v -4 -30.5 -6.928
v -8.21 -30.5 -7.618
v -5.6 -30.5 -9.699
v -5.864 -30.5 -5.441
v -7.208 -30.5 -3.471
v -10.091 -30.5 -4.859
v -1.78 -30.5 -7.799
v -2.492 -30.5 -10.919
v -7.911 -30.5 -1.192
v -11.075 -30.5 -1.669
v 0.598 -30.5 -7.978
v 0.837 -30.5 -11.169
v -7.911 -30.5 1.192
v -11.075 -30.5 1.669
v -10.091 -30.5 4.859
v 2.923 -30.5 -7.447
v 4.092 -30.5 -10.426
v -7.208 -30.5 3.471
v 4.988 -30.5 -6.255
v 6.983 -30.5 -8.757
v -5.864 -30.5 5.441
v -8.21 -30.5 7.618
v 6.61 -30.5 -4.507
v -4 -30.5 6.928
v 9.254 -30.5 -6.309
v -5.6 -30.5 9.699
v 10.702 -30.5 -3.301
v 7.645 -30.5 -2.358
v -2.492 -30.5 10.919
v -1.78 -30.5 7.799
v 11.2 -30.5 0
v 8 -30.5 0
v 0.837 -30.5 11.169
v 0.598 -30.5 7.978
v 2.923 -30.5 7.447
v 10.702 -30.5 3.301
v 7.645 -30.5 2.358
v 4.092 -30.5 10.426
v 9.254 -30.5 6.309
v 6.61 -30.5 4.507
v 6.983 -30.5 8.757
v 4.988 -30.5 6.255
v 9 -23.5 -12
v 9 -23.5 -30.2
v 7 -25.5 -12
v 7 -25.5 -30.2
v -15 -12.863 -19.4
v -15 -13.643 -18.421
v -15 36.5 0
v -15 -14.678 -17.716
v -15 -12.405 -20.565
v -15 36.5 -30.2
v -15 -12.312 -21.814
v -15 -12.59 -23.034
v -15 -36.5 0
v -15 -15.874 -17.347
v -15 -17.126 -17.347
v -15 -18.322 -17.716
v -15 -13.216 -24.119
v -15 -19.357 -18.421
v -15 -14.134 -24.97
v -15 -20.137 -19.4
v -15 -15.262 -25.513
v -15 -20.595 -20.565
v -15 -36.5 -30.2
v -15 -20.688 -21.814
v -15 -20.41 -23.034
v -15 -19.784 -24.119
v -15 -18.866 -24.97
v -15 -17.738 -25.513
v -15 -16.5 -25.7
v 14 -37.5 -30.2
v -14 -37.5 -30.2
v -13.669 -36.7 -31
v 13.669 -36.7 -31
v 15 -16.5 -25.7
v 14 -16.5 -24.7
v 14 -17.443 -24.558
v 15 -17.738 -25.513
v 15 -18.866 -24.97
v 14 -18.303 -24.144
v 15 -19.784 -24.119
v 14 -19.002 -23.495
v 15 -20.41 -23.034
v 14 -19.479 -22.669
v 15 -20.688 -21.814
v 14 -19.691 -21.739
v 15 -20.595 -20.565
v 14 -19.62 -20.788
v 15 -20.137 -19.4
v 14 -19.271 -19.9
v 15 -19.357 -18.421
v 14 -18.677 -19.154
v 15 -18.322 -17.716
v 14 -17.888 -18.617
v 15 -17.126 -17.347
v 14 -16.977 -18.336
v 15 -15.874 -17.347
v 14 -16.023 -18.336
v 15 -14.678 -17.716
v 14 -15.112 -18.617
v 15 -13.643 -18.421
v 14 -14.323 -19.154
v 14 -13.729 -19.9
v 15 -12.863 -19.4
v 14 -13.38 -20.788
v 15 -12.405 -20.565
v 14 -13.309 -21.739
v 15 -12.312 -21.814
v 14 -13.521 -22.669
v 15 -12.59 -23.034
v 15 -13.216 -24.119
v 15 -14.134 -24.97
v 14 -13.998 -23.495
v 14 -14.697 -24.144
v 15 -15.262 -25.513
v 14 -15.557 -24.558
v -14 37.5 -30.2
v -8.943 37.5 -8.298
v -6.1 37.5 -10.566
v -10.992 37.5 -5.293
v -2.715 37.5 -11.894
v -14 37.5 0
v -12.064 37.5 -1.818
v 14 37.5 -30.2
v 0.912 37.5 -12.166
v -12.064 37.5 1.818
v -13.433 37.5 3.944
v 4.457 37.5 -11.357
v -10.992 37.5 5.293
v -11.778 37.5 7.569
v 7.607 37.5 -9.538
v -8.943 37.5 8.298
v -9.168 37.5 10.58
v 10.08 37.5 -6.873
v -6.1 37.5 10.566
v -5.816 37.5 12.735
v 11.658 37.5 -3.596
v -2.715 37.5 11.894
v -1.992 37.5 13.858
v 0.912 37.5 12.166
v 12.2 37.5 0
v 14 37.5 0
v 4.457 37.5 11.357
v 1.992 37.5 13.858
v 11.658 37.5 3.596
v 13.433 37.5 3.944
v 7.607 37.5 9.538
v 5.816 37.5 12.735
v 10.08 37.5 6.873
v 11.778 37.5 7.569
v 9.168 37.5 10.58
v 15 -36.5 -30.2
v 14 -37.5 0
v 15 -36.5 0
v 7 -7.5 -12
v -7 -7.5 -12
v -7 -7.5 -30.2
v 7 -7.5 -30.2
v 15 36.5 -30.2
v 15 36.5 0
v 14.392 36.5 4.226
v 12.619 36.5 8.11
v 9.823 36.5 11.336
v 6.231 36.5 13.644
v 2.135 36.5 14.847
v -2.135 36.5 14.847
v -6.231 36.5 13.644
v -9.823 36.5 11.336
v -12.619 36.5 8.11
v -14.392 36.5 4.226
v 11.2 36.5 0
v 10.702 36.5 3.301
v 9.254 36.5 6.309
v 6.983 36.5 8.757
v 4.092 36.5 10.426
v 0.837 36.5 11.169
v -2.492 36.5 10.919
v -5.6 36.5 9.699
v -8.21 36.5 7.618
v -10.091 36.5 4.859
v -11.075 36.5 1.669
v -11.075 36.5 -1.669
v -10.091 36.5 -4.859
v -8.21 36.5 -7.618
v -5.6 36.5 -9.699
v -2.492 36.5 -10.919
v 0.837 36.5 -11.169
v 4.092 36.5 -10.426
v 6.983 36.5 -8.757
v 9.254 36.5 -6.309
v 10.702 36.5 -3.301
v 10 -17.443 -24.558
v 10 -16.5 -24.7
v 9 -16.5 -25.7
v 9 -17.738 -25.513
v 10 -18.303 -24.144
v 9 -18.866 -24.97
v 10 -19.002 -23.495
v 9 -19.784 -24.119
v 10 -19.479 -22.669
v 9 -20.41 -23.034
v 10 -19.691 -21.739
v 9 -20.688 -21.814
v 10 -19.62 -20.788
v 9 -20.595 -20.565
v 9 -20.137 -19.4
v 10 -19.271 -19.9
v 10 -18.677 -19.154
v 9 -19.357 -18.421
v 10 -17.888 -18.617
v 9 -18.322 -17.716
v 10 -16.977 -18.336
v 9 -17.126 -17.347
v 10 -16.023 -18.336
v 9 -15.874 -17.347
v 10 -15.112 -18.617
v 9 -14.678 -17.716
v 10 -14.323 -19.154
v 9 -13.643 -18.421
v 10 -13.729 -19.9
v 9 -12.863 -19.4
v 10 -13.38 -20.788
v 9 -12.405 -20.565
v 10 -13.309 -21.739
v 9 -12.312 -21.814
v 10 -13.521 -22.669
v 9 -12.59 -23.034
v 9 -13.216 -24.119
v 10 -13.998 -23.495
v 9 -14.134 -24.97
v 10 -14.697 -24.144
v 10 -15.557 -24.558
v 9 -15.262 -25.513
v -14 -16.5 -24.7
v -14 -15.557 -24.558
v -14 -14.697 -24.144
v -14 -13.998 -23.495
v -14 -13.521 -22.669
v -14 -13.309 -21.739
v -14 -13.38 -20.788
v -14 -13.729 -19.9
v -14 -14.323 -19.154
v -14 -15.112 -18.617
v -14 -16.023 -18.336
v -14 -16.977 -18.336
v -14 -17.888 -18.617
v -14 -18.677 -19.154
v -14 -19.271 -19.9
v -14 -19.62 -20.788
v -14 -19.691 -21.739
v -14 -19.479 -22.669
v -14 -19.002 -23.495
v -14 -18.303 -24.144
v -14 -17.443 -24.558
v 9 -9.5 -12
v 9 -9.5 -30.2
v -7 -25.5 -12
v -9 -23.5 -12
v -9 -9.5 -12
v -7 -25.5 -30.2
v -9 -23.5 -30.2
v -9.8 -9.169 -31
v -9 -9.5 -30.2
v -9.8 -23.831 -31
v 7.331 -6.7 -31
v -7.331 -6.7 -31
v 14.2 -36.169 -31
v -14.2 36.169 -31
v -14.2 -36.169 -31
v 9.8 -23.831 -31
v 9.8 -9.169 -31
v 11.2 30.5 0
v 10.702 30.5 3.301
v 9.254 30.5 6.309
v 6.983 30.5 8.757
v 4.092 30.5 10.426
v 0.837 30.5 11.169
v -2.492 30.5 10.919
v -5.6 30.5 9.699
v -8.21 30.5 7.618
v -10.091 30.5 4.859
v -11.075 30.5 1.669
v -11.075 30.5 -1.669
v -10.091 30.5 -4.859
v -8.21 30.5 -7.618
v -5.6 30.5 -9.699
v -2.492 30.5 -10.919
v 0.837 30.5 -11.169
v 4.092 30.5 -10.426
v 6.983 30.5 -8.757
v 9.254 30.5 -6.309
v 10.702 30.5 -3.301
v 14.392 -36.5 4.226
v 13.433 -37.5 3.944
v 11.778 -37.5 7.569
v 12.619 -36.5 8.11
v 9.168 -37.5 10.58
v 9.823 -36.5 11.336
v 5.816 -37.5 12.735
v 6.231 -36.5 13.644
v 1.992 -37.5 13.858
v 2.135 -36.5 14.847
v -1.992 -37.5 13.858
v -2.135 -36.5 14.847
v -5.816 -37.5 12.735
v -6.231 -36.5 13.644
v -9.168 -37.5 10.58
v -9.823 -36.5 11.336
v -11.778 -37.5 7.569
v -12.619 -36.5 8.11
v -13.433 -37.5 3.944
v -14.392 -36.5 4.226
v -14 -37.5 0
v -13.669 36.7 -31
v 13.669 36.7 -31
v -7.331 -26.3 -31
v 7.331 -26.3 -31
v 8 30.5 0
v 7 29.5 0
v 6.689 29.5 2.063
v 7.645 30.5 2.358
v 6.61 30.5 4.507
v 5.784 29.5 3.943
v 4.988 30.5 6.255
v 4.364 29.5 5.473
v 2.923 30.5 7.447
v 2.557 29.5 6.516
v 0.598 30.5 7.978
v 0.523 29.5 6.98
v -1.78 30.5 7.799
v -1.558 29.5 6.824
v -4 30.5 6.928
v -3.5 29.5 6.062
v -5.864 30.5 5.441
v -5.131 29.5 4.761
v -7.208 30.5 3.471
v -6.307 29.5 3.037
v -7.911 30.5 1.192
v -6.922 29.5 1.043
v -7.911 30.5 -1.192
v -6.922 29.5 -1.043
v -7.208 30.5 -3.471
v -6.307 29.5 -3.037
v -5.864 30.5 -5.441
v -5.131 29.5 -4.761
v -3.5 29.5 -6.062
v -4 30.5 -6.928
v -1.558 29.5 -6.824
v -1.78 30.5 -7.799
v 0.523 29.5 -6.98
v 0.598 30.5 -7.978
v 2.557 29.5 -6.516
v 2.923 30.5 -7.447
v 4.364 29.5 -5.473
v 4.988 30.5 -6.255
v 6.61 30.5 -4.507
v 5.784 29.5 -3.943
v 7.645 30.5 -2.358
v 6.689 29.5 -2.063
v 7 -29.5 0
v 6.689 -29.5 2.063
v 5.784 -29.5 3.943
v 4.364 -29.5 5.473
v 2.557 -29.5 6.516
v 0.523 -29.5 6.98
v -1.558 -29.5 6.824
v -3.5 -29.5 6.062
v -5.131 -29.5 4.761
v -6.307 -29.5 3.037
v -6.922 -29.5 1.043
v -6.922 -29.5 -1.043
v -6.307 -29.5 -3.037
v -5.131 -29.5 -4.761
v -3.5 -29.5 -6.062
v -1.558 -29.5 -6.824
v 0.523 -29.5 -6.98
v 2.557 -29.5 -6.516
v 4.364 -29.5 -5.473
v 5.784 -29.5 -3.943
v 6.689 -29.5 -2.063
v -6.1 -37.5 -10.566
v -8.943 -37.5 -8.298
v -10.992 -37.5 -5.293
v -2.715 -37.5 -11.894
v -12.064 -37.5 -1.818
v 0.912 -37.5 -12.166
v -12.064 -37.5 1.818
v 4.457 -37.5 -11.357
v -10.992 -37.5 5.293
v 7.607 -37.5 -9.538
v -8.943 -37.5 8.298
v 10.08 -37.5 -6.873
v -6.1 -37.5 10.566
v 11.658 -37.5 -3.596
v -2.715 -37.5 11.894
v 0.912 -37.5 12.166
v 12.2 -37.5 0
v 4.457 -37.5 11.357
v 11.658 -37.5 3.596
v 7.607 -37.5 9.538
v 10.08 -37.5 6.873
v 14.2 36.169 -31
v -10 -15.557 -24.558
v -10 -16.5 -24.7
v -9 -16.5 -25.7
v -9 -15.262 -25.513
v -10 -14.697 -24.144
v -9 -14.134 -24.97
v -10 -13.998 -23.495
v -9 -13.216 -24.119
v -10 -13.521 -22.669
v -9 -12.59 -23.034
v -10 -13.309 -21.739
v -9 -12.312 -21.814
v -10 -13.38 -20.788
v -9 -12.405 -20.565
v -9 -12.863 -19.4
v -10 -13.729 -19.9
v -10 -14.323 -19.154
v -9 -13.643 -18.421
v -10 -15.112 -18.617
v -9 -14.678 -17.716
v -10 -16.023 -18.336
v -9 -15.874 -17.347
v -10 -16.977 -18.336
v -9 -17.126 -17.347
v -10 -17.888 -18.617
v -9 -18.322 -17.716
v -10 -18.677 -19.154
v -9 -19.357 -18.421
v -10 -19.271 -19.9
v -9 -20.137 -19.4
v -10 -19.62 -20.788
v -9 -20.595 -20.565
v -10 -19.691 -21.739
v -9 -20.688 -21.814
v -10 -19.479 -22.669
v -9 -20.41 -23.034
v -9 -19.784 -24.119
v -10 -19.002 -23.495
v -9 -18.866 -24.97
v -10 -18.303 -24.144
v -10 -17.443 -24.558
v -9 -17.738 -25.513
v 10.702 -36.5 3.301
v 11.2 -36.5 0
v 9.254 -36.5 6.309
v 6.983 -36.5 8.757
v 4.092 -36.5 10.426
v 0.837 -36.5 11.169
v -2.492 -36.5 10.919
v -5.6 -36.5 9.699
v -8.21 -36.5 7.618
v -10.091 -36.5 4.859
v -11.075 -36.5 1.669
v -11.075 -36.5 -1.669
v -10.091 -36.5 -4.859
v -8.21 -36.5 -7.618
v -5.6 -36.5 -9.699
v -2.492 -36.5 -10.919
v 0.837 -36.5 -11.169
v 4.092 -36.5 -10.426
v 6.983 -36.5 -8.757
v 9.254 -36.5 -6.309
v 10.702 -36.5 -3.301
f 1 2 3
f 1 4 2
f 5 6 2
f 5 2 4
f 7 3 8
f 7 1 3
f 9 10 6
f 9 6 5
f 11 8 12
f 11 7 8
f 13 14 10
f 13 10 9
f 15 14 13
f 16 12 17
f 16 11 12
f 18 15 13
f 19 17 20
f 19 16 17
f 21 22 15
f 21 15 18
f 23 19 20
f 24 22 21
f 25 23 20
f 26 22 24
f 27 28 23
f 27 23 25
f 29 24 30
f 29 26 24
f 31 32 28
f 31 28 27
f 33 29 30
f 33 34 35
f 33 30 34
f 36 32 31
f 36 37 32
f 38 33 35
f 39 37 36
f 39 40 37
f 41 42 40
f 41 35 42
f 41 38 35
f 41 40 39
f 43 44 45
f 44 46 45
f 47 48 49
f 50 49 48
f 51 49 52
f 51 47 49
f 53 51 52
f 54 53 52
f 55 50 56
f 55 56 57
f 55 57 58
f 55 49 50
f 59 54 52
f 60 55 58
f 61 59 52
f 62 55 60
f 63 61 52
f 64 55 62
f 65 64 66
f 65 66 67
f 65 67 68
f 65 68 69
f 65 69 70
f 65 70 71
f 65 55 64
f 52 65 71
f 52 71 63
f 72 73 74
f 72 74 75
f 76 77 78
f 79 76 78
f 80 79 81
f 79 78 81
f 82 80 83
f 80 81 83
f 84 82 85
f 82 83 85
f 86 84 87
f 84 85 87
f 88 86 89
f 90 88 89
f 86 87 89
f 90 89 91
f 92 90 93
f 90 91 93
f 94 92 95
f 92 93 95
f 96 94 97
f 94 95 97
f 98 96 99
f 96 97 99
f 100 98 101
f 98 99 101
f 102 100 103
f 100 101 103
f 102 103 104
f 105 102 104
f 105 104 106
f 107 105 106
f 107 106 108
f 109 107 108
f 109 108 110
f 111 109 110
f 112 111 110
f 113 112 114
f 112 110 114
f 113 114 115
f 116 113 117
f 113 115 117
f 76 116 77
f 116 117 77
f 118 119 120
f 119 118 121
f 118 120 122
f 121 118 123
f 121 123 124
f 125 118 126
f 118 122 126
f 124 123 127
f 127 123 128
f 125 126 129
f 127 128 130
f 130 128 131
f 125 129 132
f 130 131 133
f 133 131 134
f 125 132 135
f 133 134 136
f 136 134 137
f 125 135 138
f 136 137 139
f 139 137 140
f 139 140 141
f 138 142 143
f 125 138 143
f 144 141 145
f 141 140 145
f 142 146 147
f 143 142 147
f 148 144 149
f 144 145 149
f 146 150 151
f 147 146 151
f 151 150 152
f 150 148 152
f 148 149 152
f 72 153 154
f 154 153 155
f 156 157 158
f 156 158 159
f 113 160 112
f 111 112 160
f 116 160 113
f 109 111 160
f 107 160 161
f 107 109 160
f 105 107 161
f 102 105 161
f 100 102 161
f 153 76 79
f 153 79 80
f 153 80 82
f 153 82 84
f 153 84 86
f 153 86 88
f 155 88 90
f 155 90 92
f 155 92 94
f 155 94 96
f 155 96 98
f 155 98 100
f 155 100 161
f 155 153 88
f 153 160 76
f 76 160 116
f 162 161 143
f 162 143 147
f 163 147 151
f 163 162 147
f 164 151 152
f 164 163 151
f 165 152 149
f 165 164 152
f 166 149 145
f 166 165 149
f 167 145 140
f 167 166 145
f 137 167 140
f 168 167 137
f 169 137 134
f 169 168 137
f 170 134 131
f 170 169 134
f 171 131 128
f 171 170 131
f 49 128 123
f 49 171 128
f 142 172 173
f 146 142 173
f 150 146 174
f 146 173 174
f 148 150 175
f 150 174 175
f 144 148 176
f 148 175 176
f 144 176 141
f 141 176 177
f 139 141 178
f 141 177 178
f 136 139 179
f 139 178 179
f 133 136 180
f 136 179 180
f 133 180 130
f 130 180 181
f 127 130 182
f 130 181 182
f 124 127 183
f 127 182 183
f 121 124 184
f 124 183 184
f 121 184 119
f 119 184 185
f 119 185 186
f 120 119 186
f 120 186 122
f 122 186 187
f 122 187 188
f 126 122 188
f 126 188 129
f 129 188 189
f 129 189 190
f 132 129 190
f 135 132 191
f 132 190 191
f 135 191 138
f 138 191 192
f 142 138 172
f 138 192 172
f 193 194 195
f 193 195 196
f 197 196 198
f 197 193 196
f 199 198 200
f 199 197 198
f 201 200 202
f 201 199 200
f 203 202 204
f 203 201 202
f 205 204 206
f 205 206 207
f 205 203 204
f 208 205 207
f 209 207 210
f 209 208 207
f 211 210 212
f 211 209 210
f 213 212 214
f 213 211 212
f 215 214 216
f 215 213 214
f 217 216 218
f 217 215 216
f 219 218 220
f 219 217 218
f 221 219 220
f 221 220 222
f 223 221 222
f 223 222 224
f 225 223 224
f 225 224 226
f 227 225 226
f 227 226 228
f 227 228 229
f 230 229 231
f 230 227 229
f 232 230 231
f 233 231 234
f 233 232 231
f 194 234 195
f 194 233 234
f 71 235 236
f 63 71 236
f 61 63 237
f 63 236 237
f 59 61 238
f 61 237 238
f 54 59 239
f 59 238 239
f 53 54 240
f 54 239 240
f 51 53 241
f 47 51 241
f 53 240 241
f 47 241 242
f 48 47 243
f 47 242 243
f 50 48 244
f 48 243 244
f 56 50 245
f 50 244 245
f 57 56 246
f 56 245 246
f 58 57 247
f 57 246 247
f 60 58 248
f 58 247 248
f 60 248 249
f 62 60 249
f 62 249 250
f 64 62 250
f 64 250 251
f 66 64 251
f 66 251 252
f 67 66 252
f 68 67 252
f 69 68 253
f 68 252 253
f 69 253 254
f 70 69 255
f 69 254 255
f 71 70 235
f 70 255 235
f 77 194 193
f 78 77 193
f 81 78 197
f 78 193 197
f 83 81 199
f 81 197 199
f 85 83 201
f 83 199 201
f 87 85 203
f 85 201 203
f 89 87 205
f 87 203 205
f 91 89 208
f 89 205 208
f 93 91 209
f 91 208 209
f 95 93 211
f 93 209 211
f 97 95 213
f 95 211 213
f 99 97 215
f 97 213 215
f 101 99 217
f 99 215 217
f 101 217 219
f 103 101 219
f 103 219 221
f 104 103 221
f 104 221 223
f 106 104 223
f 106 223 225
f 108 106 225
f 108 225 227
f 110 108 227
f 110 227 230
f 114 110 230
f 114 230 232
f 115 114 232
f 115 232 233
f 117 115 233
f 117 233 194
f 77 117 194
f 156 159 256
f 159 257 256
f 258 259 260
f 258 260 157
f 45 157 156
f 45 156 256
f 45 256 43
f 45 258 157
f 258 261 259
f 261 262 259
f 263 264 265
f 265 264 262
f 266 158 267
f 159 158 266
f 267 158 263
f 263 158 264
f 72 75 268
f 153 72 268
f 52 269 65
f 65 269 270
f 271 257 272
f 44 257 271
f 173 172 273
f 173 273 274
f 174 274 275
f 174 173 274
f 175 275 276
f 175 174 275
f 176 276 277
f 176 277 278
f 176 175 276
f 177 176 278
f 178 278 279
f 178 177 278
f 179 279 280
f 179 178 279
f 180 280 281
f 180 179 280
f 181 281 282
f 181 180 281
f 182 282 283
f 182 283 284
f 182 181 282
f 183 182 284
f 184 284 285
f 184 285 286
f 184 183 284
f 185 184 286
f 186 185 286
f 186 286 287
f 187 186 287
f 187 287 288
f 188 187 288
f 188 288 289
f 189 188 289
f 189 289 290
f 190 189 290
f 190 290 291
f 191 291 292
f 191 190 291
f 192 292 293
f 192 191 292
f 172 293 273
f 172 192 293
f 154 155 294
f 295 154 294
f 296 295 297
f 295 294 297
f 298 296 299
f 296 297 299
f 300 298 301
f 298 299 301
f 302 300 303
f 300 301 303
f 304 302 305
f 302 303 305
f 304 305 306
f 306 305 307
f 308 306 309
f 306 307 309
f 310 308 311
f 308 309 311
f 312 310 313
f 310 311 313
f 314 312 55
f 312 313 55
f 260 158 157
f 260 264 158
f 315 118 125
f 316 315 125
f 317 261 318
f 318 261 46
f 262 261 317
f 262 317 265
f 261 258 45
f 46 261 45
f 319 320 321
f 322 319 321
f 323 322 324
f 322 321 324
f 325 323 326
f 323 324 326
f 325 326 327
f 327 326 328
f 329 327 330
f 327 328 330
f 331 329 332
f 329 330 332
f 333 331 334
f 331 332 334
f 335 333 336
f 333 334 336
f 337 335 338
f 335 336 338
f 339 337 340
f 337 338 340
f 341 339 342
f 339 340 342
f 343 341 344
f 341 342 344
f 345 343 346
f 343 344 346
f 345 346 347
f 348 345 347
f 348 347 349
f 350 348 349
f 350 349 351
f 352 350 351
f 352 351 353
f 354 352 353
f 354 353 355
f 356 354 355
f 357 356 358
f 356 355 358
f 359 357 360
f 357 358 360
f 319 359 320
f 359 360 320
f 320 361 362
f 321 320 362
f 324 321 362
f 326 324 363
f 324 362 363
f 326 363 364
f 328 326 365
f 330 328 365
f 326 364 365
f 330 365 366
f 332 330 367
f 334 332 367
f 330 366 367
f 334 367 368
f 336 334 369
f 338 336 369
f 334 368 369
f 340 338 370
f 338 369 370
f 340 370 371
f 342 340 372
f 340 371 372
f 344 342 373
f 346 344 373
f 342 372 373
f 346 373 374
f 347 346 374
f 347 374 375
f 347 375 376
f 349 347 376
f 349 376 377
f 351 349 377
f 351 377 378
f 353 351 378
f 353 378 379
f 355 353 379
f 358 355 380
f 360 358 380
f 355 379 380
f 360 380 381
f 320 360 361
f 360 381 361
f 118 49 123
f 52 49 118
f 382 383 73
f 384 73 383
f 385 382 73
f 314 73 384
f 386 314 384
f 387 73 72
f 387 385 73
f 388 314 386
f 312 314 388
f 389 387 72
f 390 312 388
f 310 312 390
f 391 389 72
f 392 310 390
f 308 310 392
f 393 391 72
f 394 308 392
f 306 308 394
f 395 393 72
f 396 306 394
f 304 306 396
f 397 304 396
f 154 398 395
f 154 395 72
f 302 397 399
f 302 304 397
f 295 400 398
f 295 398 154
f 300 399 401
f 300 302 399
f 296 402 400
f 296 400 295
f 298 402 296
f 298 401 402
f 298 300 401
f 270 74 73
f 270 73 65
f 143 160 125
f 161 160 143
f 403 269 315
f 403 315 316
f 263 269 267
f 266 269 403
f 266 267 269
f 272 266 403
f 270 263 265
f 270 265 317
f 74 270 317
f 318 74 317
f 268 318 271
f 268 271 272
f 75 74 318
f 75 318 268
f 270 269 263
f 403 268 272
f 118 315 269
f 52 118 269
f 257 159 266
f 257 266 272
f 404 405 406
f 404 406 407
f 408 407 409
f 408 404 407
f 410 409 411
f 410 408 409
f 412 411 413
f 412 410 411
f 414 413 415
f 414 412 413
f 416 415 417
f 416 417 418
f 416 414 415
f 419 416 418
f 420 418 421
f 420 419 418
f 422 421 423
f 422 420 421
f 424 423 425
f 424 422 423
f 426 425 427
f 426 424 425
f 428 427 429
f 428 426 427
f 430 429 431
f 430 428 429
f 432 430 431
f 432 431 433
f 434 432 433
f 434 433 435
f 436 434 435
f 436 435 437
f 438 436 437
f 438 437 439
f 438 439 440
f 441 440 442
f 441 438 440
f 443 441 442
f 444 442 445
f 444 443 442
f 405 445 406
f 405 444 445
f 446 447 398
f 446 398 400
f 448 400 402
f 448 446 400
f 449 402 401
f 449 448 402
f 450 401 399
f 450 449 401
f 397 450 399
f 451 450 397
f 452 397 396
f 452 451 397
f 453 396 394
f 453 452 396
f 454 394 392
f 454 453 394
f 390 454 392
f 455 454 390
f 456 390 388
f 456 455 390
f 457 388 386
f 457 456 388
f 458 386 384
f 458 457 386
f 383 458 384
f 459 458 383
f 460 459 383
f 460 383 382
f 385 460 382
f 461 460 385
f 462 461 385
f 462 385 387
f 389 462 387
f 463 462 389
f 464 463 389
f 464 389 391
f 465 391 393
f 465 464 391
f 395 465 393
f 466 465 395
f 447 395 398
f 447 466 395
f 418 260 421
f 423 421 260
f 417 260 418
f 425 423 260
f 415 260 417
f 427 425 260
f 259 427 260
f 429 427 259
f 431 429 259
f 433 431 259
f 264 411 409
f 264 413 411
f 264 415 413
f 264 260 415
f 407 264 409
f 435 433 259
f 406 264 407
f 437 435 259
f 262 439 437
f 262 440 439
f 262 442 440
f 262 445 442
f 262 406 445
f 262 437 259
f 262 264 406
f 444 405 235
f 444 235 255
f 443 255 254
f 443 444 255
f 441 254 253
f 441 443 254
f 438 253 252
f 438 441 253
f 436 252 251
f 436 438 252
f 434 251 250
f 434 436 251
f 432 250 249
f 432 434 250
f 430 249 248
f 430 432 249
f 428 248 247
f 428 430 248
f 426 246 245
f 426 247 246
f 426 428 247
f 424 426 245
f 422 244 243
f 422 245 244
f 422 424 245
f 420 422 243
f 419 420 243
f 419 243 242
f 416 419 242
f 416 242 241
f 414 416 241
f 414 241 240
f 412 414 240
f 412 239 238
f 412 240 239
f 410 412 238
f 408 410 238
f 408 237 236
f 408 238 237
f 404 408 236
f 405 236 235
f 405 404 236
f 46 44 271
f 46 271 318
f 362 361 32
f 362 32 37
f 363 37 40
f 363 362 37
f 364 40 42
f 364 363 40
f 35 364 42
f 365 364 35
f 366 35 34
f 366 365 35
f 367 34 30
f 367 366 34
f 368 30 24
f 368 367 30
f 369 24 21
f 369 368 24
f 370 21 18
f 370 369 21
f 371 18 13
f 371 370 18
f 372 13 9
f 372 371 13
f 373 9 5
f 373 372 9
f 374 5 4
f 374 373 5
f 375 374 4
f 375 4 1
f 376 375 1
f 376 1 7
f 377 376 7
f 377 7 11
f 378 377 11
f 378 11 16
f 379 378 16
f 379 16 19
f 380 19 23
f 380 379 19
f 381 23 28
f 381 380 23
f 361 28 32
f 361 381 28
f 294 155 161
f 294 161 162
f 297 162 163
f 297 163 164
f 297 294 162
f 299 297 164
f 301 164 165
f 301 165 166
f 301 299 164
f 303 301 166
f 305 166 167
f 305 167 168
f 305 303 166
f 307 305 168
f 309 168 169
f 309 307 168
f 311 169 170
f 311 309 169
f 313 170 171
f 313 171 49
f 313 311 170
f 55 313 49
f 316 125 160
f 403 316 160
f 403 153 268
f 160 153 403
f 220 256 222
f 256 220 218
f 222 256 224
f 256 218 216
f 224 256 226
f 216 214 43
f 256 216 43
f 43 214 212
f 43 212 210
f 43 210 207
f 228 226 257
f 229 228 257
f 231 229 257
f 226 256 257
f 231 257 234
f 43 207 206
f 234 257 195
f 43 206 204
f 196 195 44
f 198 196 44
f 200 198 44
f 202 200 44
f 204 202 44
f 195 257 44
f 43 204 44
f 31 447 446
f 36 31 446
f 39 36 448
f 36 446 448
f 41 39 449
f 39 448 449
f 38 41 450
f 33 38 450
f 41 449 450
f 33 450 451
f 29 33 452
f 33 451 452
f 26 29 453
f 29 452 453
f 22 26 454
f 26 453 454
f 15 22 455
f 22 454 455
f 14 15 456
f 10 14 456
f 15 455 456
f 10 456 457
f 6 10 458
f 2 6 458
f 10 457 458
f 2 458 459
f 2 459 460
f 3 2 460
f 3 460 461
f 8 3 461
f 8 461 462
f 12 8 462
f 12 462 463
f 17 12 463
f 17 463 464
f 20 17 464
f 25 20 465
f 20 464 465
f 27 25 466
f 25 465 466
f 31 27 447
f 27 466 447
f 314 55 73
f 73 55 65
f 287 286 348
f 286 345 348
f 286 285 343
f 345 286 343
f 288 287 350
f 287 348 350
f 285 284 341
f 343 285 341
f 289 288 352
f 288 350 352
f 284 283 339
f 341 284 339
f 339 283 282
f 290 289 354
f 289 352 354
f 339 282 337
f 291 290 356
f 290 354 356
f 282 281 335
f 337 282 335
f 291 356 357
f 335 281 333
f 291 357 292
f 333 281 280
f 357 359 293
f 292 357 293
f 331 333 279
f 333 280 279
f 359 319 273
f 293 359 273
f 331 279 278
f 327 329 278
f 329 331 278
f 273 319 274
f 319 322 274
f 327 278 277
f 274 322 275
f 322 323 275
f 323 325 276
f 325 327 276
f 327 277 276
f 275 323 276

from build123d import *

# Parameters (mm, degrees)
PAD038_DEPTH         = 37.5
SKETCH074_R          = 7
POCKET033_DEPTH      = 50
SKETCH075_R          = 11.2
POCKET034_DEPTH      = 7
CHAMFER033_SIZE      = 1
SKETCH085_W          = 18
SKETCH085_H          = 18
POCKET043_DEPTH      = 19
CHAMFER036_SIZE      = 2
SKETCH086_R          = 3.2
POCKET044_DEPTH      = 6.001
POCKET044_DEPTH_BACK = 24.001
CHAMFER037_SIZE      = 1
CHAMFER038_SIZE      = 1
CHAMFER039_SIZE      = 0.8


with BuildPart() as part:
    # Sketch073 → Pad038 (new body, symmetric)
    with BuildSketch(Plane.XZ):
        with BuildLine():
            ThreePointArc((15, 0), (0, 15), (-15, 0))
            Line((-15, 0), (-15, -31))
            Line((-15, -31), (15, -31))
            Line((15, -31), (15, 0))
        make_face()
    extrude(amount=PAD038_DEPTH, both=True)

    # Sketch074 → Pocket033 (cut, symmetric)
    with BuildSketch(Plane.XZ):
        Circle(SKETCH074_R)
    extrude(amount=POCKET033_DEPTH, both=True, mode=Mode.SUBTRACT)

    # Sketch075 (on Face5 of Pocket033) → Pocket034 (cut)
    with BuildSketch(Plane.XZ.offset(37.5)):
        Circle(SKETCH075_R)
    pocket034 = extrude(amount=-POCKET034_DEPTH, mode=Mode.SUBTRACT)

    # Mirrored002: Pocket034 across XZ
    add(pocket034.mirror(Plane.XZ), mode=Mode.SUBTRACT)

    # Chamfer033
    chamfer033_edges = [part.edges().sort_by_distance(p)[0] for p in [
        (-11.2, 37.5, 0),
        (-7, 30.5, 0),
        (-11.2, -37.5, 0),
        (-7, -30.5, 0),
    ]]
    chamfer(chamfer033_edges, length=CHAMFER033_SIZE)

    # Sketch085 (on Face6 of Chamfer033) → Pocket043 (cut)
    with BuildSketch(Plane(origin=(0, 0, -31), x_dir=(1, 0, 0), z_dir=(0, 0, -1))):
        with Locations((0, 16.5)):
            Rectangle(SKETCH085_W, SKETCH085_H)
    extrude(amount=-POCKET043_DEPTH, mode=Mode.SUBTRACT)

    # Chamfer036
    chamfer036_edges = [part.edges().sort_by_distance(p)[0] for p in [
        (9, -25.5, -21.5),
        (9, -7.5, -21.5),
        (-9, -7.5, -21.5),
        (-9, -25.5, -21.5),
    ]]
    chamfer(chamfer036_edges, length=CHAMFER036_SIZE)

    # Sketch086 (on Face5 of Chamfer036) → Pocket044 (cut, two sides)
    with BuildSketch(Plane(origin=(9, 0, 0), x_dir=(0, 0, -1), z_dir=(-1, 0, 0))) as pocket044_sk:
        with Locations((21.5, 16.5)):
            Circle(SKETCH086_R)
    extrude(amount=-POCKET044_DEPTH, mode=Mode.SUBTRACT)
    extrude(pocket044_sk.sketch, amount=POCKET044_DEPTH_BACK, mode=Mode.SUBTRACT)

    # Chamfer037
    chamfer037_edges = [part.edges().sort_by_distance(p)[0] for p in [
        (15, 37.5, -15.5),
        (15, -37.5, -15.5),
    ]]
    chamfer(chamfer037_edges, length=CHAMFER037_SIZE)

    # Chamfer038
    chamfer038_edges = [part.edges().sort_by_distance(p)[0] for p in [
        (9, -16.5, -18.3),
        (-15, -16.5, -18.3),
        (-9, -16.5, -18.3),
        (15, -16.5, -18.3),
    ]]
    chamfer(chamfer038_edges, length=CHAMFER038_SIZE)

    # Chamfer039
    chamfer039_edges = [part.edges().sort_by_distance(p)[0] for p in [
        (-15, 0, -31),
        (-14.5, 37, -31),
        (-14.5, -37, -31),
        (0, 37.5, -31),
        (0, -37.5, -31),
        (14.5, 37, -31),
        (14.5, -37, -31),
        (15, 0, -31),
        (0, -25.5, -31),
        (8, -24.5, -31),
        (-8, -24.5, -31),
        (9, -16.5, -31),
        (-9, -16.5, -31),
        (8, -8.5, -31),
        (-8, -8.5, -31),
        (0, -7.5, -31),
    ]]
    chamfer(chamfer039_edges, length=CHAMFER039_SIZE)


solid = part.part
